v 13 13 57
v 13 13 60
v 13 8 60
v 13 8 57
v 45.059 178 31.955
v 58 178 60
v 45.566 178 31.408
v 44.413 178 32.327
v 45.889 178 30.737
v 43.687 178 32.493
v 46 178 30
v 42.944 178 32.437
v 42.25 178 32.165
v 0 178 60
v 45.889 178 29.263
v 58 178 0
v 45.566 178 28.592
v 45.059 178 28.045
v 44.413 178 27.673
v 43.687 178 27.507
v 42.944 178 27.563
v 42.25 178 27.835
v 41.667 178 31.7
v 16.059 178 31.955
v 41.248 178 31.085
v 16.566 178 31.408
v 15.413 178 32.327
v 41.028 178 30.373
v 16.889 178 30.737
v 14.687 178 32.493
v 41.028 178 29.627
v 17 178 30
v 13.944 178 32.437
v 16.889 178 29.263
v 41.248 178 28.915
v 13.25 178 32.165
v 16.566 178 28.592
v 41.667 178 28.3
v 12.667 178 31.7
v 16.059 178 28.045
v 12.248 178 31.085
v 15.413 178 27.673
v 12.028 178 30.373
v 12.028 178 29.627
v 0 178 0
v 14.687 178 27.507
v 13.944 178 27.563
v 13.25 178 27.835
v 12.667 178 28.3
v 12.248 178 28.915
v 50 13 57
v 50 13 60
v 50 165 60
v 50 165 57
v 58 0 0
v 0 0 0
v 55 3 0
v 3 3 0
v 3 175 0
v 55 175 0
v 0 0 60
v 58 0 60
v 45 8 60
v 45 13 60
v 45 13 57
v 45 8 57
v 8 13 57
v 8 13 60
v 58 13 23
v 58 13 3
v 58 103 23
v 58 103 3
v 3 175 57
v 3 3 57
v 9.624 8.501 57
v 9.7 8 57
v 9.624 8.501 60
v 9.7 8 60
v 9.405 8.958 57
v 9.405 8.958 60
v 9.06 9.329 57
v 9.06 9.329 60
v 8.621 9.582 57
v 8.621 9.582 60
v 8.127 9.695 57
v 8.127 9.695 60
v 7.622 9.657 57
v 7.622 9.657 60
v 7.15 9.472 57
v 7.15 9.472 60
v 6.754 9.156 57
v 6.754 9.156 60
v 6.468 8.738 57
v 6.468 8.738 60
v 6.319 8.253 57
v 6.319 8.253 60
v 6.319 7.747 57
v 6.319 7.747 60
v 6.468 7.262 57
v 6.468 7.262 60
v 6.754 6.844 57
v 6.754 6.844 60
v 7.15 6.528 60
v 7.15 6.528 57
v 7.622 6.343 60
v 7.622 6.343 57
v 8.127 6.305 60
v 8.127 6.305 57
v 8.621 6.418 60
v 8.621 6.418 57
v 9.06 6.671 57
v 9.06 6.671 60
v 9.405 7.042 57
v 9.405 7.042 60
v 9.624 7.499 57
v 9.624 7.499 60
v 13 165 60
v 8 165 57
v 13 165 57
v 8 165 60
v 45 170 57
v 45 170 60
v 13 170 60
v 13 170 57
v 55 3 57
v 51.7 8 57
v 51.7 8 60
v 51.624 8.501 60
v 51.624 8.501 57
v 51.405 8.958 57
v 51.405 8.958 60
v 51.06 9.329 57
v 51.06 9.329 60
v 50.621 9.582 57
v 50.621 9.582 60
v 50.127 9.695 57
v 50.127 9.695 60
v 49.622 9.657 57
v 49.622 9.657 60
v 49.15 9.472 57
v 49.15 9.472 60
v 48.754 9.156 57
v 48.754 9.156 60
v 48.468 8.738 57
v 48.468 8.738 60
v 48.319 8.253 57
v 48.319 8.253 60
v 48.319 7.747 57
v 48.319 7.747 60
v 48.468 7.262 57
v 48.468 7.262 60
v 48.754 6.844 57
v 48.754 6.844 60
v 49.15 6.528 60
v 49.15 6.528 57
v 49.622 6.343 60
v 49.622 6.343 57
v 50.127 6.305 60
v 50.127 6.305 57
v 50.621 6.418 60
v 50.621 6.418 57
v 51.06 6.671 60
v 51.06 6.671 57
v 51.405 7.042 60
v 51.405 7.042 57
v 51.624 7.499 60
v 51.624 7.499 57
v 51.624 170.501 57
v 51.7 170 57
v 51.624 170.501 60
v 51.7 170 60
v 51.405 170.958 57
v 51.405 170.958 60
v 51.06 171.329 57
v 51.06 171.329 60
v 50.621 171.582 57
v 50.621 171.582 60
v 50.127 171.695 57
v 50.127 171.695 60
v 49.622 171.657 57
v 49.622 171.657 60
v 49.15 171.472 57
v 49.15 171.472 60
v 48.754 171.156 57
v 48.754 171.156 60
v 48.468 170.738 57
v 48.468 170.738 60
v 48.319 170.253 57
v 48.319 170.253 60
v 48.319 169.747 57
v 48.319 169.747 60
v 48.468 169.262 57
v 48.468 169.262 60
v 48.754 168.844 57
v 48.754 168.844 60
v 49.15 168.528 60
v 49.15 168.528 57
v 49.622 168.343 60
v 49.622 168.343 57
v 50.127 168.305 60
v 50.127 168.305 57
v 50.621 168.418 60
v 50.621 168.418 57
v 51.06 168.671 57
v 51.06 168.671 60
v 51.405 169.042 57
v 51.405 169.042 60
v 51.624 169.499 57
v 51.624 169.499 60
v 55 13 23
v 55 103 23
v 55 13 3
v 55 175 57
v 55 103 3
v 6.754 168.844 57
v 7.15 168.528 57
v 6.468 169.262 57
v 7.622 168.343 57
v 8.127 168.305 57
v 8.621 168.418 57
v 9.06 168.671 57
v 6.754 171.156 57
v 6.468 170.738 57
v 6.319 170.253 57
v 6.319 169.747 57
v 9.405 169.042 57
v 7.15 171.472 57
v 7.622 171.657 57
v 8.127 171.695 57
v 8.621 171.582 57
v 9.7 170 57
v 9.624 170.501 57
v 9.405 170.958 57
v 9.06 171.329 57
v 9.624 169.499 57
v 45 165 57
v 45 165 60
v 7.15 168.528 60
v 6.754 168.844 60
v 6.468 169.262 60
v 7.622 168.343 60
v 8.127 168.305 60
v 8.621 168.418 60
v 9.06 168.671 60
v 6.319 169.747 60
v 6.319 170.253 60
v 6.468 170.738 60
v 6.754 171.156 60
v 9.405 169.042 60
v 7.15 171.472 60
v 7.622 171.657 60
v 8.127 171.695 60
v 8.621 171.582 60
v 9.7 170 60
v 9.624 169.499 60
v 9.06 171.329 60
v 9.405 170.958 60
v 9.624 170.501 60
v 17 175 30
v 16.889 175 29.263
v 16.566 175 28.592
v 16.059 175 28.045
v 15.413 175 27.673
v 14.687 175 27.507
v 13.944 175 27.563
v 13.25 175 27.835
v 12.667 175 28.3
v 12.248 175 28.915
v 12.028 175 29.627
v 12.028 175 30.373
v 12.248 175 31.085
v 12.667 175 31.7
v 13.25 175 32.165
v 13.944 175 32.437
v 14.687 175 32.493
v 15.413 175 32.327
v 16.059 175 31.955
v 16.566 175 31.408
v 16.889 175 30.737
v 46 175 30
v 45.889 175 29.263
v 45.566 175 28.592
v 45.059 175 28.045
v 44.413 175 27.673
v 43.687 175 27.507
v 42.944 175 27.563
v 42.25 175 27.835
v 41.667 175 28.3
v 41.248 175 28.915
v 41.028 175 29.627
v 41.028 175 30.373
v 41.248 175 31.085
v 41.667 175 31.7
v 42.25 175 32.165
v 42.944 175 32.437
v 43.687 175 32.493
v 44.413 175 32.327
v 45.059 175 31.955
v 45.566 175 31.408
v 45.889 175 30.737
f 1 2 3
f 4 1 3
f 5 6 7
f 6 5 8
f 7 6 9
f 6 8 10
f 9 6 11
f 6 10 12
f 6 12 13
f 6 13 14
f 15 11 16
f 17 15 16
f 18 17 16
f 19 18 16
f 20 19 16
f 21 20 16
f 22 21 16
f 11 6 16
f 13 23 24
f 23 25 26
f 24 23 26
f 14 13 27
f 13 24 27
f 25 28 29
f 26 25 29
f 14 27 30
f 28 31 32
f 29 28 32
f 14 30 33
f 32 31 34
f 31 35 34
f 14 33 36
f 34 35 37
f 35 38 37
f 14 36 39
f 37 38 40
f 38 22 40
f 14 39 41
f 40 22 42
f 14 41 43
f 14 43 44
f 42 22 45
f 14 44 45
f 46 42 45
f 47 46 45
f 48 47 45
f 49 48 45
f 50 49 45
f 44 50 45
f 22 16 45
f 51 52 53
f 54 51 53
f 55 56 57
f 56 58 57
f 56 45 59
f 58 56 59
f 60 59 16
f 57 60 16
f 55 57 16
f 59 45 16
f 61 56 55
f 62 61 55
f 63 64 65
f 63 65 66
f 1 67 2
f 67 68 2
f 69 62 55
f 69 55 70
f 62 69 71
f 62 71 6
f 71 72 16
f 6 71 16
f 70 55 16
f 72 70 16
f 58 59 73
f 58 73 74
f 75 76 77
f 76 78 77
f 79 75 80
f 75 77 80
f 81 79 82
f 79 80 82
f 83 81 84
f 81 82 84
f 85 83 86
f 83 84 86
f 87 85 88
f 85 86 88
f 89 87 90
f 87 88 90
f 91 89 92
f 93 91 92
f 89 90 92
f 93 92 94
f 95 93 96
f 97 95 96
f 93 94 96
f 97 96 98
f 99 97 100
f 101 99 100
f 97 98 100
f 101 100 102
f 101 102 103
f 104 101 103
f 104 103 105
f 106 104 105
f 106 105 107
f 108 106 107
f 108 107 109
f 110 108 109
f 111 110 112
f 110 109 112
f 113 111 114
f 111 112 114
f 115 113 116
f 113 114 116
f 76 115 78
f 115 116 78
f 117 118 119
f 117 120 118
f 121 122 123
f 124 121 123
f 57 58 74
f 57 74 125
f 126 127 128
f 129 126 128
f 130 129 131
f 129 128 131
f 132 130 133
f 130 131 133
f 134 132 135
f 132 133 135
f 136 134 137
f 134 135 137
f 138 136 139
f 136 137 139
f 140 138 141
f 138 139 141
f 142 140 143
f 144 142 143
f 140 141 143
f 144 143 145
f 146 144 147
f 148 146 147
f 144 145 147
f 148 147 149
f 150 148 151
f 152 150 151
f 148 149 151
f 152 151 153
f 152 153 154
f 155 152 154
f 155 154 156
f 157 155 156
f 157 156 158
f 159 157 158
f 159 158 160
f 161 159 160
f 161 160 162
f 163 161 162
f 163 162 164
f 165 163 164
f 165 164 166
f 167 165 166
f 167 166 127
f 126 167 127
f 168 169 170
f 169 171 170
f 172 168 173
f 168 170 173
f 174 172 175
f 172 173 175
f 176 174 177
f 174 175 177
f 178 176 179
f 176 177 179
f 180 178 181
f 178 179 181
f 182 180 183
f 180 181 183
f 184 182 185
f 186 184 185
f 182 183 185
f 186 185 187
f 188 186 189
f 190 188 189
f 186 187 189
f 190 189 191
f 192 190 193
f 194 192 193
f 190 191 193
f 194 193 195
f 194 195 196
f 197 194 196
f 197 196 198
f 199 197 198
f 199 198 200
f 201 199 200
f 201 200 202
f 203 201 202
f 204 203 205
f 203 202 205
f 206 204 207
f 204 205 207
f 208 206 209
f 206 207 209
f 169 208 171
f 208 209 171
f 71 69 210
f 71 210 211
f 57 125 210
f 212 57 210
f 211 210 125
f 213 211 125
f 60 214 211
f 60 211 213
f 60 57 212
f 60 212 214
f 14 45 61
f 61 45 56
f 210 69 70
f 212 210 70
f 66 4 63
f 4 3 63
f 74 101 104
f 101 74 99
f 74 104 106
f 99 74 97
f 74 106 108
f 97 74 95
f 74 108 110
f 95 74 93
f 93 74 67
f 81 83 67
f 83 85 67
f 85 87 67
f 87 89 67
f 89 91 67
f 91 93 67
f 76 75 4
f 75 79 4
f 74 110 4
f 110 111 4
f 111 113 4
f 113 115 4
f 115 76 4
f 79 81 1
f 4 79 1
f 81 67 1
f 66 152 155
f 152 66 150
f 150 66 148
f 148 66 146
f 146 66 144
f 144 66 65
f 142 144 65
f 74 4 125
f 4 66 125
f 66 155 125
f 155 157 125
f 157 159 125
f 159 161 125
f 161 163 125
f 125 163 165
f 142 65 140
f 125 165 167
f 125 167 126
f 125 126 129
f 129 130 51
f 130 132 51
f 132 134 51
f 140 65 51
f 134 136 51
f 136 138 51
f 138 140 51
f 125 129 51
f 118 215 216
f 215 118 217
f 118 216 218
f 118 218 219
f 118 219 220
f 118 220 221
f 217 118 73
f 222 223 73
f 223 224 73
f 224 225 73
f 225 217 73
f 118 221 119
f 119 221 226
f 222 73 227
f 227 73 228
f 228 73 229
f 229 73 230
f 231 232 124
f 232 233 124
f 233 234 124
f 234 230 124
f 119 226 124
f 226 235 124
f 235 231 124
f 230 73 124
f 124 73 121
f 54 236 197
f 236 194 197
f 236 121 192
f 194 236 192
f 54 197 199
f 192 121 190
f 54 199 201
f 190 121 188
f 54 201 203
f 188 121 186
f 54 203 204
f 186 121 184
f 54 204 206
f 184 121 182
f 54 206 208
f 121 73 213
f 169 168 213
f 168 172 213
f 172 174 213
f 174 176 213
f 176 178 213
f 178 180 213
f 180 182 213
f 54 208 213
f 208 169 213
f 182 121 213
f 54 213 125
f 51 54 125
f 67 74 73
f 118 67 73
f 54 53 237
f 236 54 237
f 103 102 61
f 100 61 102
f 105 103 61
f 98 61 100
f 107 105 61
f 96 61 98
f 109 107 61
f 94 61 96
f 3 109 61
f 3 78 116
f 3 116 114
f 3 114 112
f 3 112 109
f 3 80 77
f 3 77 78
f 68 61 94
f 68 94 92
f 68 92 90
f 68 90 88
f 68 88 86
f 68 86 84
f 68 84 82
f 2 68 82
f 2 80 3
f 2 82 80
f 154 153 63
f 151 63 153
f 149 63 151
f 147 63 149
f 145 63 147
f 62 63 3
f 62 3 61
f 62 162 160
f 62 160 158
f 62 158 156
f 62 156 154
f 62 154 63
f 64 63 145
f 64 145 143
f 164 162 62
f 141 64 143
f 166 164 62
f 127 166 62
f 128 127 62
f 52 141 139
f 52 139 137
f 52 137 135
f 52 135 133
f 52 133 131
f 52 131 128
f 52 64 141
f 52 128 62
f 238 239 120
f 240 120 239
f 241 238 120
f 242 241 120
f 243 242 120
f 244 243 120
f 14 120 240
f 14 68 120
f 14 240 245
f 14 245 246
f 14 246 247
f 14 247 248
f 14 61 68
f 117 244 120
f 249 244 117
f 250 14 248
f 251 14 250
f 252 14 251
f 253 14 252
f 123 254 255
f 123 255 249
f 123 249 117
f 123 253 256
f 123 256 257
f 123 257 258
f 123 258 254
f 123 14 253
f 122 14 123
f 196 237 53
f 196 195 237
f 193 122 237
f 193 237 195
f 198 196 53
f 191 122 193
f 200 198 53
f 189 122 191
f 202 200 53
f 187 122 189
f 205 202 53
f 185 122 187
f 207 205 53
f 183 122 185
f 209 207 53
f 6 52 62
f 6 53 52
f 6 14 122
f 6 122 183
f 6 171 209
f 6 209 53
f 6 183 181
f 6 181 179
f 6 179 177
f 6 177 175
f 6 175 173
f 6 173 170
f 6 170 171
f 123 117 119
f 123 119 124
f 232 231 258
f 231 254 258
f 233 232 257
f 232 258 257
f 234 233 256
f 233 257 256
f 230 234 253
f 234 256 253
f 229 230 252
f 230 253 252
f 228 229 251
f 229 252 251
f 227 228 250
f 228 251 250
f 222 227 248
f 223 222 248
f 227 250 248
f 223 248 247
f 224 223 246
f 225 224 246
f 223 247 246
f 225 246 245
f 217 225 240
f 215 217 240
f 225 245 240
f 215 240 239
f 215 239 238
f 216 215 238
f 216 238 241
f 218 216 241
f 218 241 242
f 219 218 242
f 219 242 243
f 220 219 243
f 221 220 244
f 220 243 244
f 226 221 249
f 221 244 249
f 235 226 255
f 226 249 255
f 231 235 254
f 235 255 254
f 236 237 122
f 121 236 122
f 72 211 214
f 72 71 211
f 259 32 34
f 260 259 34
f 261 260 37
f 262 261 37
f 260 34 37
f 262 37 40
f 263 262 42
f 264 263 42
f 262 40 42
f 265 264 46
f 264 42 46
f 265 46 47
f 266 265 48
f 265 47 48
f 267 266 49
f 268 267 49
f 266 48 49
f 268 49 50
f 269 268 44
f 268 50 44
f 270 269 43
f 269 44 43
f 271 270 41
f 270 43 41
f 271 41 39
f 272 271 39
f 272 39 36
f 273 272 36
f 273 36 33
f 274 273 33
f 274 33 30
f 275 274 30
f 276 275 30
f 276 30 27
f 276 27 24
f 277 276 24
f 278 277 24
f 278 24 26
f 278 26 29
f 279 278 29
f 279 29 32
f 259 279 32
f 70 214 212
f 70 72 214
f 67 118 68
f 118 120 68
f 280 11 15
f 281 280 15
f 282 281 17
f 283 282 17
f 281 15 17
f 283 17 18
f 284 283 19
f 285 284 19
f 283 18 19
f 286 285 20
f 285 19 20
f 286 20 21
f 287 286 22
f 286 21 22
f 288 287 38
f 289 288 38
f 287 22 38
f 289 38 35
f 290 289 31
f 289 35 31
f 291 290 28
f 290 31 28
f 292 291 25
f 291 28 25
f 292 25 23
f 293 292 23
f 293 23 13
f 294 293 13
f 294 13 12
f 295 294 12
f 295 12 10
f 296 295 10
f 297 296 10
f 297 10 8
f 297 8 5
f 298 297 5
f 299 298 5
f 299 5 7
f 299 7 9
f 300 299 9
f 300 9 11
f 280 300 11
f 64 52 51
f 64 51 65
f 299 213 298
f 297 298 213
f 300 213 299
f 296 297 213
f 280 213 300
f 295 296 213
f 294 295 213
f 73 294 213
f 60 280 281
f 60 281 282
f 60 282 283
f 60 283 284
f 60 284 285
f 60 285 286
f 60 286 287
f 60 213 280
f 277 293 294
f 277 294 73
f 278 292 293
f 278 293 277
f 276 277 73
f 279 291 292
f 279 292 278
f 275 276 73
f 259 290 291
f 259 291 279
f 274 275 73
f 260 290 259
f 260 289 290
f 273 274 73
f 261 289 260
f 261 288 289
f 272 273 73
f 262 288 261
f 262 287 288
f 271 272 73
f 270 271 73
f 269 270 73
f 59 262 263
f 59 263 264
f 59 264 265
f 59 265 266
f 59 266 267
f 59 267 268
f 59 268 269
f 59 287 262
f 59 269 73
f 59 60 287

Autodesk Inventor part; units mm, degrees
ref_plane "YZ Plane" through (0, 0, 0) normal (1, 0, 0) x (0, 1, 0)
ref_plane "XZ Plane" through (0, 0, 0) normal (0, 1, 0) x (-1, 0, 0)
ref_plane "XY Plane" through (0, 0, 0) normal (0, 0, 1) x (1, 0, 0)
sketch "Sketch1" plane through (0, 0, 0) normal (0, 0, 1) x (1, 0, 0)
  line L0 (0, 0) -> (58, 0)
  line L1 (58, 0) -> (58, 178)
  line L2 (58, 178) -> (0, 178)
  line L3 (0, 178) -> (0, 0)
  dimension "d0" = 58
  dimension "d1" = 178
extrude "Extrusion1" add sketch "Sketch1" along normal blind 60
shell "Shell1" thickness 3 removed faces 1 at (19.3333, 118.6667, 0)
sketch "Sketch2" plane through (0, 0, 60) normal (0, 0, 1) x (1, 0, 0)
  line L0 (3, 3) -> (55, 3) projected
  line L1 (3, 3) -> (8, 3)
  line L2 (8, 3) -> (8, 6.3)
  line L3 (55, 3) -> (55, 175) projected
  line L4 (55, 175) -> (55, 170)
  line L5 (55, 170) -> (51.7, 170)
  line L6 (48.3, 170) -> (9.7, 170)
  line L7 (8, 168.3) -> (8, 9.7)
  line L8 (9.7, 8) -> (48.3, 8)
  line L9 (50, 9.7) -> (50, 168.3)
  circle A0 centre (8, 8) radius 1.7
  line L10 (9.7, 8) -> (13, 8)
  line L11 (8, 9.7) -> (8, 13)
  line L12 (8, 13) -> (13, 13)
  line L13 (13, 13) -> (13, 8)
  line L14 (29, 8) -> (29, 9.7)
  circle A1 centre (50, 8) radius 1.7
  line L15 (48.3, 8) -> (45, 8)
  line L16 (50, 9.7) -> (50, 13)
  line L17 (50, 13) -> (45, 13)
  line L18 (45, 13) -> (45, 8)
  line L19 (50, 89) -> (45, 89)
  circle A2 centre (8, 170) radius 1.7
  line L20 (9.7, 170) -> (13, 170)
  line L21 (8, 168.3) -> (8, 165)
  line L22 (8, 165) -> (13, 165)
  line L23 (13, 165) -> (13, 170)
  circle A3 centre (50, 170) radius 1.7
  line L24 (48.3, 170) -> (45, 170)
  line L25 (50, 168.3) -> (50, 165)
  line L26 (45, 165) -> (45, 170)
  line L27 (50, 165) -> (45, 165)
  point P0 (0, 0)
  point P1 (58, 0)
  point P2 (58, 178)
  point P3 (0, 178)
  point P4 (50, 6.3)
  point P5 (8, 171.7)
  point P6 (50, 171.7)
  dimension "d29" = 5
  dimension "d31" = 5
  dimension "d32" = 5
  dimension "d33" = 3.4
  dimension "d34" = 3.3
  dimension "d35" = 3.3
extrude "Extrusion4" cut sketch "Sketch2" against normal blind 3 contours A0 | A3 | L7 L22 L23 L6 L26 L27 L9 L17 L18 L8 L13 L12 | A2 | A1
sketch "Sketch4" plane through (58, 0, 0) normal (1, 0, 0) x (0, 0, -1)
  line L0 (0, 3) -> (-57, 3) projected
  line L1 (0, 3) -> (-3, 3)
  line L2 (-3, 3) -> (-23, 3)
  line L3 (-23, 3) -> (-23, 103)
  line L4 (-23, 103) -> (-3, 103)
  line L5 (-3, 103) -> (-3, 3)
  line L6 (-23, 3) -> (-23, 13)
  line L7 (-23, 13) -> (-3, 13)
  point P0 (0, 0)
  dimension "d38" = 3
  dimension "d39" = 20
  dimension "d40" = 100
  dimension "d41" = 10
extrude "Extrusion5" cut sketch "Sketch4" against normal blind 4 contours L7 L3 L4 L5
sketch "Sketch5" plane through (0, 178, 0) normal (0, 1, 0) x (1, 0, 0)
  line L0 (55, 0) -> (3, 0) projected
  line L1 (29, 0) -> (29, -60)
  line L2 (58, -60) -> (0, -60) projected
  line L3 (55, 0) -> (55, -57) projected
  circle A0 centre (43.5, -30) radius 2.5
  circle A1 centre (14.5, -30) radius 2.5
  point P0 (0, 0)
  dimension "d44" = 5
extrude "Extrusion6" cut sketch "Sketch5" against normal blind 4
properties part number "port side"
